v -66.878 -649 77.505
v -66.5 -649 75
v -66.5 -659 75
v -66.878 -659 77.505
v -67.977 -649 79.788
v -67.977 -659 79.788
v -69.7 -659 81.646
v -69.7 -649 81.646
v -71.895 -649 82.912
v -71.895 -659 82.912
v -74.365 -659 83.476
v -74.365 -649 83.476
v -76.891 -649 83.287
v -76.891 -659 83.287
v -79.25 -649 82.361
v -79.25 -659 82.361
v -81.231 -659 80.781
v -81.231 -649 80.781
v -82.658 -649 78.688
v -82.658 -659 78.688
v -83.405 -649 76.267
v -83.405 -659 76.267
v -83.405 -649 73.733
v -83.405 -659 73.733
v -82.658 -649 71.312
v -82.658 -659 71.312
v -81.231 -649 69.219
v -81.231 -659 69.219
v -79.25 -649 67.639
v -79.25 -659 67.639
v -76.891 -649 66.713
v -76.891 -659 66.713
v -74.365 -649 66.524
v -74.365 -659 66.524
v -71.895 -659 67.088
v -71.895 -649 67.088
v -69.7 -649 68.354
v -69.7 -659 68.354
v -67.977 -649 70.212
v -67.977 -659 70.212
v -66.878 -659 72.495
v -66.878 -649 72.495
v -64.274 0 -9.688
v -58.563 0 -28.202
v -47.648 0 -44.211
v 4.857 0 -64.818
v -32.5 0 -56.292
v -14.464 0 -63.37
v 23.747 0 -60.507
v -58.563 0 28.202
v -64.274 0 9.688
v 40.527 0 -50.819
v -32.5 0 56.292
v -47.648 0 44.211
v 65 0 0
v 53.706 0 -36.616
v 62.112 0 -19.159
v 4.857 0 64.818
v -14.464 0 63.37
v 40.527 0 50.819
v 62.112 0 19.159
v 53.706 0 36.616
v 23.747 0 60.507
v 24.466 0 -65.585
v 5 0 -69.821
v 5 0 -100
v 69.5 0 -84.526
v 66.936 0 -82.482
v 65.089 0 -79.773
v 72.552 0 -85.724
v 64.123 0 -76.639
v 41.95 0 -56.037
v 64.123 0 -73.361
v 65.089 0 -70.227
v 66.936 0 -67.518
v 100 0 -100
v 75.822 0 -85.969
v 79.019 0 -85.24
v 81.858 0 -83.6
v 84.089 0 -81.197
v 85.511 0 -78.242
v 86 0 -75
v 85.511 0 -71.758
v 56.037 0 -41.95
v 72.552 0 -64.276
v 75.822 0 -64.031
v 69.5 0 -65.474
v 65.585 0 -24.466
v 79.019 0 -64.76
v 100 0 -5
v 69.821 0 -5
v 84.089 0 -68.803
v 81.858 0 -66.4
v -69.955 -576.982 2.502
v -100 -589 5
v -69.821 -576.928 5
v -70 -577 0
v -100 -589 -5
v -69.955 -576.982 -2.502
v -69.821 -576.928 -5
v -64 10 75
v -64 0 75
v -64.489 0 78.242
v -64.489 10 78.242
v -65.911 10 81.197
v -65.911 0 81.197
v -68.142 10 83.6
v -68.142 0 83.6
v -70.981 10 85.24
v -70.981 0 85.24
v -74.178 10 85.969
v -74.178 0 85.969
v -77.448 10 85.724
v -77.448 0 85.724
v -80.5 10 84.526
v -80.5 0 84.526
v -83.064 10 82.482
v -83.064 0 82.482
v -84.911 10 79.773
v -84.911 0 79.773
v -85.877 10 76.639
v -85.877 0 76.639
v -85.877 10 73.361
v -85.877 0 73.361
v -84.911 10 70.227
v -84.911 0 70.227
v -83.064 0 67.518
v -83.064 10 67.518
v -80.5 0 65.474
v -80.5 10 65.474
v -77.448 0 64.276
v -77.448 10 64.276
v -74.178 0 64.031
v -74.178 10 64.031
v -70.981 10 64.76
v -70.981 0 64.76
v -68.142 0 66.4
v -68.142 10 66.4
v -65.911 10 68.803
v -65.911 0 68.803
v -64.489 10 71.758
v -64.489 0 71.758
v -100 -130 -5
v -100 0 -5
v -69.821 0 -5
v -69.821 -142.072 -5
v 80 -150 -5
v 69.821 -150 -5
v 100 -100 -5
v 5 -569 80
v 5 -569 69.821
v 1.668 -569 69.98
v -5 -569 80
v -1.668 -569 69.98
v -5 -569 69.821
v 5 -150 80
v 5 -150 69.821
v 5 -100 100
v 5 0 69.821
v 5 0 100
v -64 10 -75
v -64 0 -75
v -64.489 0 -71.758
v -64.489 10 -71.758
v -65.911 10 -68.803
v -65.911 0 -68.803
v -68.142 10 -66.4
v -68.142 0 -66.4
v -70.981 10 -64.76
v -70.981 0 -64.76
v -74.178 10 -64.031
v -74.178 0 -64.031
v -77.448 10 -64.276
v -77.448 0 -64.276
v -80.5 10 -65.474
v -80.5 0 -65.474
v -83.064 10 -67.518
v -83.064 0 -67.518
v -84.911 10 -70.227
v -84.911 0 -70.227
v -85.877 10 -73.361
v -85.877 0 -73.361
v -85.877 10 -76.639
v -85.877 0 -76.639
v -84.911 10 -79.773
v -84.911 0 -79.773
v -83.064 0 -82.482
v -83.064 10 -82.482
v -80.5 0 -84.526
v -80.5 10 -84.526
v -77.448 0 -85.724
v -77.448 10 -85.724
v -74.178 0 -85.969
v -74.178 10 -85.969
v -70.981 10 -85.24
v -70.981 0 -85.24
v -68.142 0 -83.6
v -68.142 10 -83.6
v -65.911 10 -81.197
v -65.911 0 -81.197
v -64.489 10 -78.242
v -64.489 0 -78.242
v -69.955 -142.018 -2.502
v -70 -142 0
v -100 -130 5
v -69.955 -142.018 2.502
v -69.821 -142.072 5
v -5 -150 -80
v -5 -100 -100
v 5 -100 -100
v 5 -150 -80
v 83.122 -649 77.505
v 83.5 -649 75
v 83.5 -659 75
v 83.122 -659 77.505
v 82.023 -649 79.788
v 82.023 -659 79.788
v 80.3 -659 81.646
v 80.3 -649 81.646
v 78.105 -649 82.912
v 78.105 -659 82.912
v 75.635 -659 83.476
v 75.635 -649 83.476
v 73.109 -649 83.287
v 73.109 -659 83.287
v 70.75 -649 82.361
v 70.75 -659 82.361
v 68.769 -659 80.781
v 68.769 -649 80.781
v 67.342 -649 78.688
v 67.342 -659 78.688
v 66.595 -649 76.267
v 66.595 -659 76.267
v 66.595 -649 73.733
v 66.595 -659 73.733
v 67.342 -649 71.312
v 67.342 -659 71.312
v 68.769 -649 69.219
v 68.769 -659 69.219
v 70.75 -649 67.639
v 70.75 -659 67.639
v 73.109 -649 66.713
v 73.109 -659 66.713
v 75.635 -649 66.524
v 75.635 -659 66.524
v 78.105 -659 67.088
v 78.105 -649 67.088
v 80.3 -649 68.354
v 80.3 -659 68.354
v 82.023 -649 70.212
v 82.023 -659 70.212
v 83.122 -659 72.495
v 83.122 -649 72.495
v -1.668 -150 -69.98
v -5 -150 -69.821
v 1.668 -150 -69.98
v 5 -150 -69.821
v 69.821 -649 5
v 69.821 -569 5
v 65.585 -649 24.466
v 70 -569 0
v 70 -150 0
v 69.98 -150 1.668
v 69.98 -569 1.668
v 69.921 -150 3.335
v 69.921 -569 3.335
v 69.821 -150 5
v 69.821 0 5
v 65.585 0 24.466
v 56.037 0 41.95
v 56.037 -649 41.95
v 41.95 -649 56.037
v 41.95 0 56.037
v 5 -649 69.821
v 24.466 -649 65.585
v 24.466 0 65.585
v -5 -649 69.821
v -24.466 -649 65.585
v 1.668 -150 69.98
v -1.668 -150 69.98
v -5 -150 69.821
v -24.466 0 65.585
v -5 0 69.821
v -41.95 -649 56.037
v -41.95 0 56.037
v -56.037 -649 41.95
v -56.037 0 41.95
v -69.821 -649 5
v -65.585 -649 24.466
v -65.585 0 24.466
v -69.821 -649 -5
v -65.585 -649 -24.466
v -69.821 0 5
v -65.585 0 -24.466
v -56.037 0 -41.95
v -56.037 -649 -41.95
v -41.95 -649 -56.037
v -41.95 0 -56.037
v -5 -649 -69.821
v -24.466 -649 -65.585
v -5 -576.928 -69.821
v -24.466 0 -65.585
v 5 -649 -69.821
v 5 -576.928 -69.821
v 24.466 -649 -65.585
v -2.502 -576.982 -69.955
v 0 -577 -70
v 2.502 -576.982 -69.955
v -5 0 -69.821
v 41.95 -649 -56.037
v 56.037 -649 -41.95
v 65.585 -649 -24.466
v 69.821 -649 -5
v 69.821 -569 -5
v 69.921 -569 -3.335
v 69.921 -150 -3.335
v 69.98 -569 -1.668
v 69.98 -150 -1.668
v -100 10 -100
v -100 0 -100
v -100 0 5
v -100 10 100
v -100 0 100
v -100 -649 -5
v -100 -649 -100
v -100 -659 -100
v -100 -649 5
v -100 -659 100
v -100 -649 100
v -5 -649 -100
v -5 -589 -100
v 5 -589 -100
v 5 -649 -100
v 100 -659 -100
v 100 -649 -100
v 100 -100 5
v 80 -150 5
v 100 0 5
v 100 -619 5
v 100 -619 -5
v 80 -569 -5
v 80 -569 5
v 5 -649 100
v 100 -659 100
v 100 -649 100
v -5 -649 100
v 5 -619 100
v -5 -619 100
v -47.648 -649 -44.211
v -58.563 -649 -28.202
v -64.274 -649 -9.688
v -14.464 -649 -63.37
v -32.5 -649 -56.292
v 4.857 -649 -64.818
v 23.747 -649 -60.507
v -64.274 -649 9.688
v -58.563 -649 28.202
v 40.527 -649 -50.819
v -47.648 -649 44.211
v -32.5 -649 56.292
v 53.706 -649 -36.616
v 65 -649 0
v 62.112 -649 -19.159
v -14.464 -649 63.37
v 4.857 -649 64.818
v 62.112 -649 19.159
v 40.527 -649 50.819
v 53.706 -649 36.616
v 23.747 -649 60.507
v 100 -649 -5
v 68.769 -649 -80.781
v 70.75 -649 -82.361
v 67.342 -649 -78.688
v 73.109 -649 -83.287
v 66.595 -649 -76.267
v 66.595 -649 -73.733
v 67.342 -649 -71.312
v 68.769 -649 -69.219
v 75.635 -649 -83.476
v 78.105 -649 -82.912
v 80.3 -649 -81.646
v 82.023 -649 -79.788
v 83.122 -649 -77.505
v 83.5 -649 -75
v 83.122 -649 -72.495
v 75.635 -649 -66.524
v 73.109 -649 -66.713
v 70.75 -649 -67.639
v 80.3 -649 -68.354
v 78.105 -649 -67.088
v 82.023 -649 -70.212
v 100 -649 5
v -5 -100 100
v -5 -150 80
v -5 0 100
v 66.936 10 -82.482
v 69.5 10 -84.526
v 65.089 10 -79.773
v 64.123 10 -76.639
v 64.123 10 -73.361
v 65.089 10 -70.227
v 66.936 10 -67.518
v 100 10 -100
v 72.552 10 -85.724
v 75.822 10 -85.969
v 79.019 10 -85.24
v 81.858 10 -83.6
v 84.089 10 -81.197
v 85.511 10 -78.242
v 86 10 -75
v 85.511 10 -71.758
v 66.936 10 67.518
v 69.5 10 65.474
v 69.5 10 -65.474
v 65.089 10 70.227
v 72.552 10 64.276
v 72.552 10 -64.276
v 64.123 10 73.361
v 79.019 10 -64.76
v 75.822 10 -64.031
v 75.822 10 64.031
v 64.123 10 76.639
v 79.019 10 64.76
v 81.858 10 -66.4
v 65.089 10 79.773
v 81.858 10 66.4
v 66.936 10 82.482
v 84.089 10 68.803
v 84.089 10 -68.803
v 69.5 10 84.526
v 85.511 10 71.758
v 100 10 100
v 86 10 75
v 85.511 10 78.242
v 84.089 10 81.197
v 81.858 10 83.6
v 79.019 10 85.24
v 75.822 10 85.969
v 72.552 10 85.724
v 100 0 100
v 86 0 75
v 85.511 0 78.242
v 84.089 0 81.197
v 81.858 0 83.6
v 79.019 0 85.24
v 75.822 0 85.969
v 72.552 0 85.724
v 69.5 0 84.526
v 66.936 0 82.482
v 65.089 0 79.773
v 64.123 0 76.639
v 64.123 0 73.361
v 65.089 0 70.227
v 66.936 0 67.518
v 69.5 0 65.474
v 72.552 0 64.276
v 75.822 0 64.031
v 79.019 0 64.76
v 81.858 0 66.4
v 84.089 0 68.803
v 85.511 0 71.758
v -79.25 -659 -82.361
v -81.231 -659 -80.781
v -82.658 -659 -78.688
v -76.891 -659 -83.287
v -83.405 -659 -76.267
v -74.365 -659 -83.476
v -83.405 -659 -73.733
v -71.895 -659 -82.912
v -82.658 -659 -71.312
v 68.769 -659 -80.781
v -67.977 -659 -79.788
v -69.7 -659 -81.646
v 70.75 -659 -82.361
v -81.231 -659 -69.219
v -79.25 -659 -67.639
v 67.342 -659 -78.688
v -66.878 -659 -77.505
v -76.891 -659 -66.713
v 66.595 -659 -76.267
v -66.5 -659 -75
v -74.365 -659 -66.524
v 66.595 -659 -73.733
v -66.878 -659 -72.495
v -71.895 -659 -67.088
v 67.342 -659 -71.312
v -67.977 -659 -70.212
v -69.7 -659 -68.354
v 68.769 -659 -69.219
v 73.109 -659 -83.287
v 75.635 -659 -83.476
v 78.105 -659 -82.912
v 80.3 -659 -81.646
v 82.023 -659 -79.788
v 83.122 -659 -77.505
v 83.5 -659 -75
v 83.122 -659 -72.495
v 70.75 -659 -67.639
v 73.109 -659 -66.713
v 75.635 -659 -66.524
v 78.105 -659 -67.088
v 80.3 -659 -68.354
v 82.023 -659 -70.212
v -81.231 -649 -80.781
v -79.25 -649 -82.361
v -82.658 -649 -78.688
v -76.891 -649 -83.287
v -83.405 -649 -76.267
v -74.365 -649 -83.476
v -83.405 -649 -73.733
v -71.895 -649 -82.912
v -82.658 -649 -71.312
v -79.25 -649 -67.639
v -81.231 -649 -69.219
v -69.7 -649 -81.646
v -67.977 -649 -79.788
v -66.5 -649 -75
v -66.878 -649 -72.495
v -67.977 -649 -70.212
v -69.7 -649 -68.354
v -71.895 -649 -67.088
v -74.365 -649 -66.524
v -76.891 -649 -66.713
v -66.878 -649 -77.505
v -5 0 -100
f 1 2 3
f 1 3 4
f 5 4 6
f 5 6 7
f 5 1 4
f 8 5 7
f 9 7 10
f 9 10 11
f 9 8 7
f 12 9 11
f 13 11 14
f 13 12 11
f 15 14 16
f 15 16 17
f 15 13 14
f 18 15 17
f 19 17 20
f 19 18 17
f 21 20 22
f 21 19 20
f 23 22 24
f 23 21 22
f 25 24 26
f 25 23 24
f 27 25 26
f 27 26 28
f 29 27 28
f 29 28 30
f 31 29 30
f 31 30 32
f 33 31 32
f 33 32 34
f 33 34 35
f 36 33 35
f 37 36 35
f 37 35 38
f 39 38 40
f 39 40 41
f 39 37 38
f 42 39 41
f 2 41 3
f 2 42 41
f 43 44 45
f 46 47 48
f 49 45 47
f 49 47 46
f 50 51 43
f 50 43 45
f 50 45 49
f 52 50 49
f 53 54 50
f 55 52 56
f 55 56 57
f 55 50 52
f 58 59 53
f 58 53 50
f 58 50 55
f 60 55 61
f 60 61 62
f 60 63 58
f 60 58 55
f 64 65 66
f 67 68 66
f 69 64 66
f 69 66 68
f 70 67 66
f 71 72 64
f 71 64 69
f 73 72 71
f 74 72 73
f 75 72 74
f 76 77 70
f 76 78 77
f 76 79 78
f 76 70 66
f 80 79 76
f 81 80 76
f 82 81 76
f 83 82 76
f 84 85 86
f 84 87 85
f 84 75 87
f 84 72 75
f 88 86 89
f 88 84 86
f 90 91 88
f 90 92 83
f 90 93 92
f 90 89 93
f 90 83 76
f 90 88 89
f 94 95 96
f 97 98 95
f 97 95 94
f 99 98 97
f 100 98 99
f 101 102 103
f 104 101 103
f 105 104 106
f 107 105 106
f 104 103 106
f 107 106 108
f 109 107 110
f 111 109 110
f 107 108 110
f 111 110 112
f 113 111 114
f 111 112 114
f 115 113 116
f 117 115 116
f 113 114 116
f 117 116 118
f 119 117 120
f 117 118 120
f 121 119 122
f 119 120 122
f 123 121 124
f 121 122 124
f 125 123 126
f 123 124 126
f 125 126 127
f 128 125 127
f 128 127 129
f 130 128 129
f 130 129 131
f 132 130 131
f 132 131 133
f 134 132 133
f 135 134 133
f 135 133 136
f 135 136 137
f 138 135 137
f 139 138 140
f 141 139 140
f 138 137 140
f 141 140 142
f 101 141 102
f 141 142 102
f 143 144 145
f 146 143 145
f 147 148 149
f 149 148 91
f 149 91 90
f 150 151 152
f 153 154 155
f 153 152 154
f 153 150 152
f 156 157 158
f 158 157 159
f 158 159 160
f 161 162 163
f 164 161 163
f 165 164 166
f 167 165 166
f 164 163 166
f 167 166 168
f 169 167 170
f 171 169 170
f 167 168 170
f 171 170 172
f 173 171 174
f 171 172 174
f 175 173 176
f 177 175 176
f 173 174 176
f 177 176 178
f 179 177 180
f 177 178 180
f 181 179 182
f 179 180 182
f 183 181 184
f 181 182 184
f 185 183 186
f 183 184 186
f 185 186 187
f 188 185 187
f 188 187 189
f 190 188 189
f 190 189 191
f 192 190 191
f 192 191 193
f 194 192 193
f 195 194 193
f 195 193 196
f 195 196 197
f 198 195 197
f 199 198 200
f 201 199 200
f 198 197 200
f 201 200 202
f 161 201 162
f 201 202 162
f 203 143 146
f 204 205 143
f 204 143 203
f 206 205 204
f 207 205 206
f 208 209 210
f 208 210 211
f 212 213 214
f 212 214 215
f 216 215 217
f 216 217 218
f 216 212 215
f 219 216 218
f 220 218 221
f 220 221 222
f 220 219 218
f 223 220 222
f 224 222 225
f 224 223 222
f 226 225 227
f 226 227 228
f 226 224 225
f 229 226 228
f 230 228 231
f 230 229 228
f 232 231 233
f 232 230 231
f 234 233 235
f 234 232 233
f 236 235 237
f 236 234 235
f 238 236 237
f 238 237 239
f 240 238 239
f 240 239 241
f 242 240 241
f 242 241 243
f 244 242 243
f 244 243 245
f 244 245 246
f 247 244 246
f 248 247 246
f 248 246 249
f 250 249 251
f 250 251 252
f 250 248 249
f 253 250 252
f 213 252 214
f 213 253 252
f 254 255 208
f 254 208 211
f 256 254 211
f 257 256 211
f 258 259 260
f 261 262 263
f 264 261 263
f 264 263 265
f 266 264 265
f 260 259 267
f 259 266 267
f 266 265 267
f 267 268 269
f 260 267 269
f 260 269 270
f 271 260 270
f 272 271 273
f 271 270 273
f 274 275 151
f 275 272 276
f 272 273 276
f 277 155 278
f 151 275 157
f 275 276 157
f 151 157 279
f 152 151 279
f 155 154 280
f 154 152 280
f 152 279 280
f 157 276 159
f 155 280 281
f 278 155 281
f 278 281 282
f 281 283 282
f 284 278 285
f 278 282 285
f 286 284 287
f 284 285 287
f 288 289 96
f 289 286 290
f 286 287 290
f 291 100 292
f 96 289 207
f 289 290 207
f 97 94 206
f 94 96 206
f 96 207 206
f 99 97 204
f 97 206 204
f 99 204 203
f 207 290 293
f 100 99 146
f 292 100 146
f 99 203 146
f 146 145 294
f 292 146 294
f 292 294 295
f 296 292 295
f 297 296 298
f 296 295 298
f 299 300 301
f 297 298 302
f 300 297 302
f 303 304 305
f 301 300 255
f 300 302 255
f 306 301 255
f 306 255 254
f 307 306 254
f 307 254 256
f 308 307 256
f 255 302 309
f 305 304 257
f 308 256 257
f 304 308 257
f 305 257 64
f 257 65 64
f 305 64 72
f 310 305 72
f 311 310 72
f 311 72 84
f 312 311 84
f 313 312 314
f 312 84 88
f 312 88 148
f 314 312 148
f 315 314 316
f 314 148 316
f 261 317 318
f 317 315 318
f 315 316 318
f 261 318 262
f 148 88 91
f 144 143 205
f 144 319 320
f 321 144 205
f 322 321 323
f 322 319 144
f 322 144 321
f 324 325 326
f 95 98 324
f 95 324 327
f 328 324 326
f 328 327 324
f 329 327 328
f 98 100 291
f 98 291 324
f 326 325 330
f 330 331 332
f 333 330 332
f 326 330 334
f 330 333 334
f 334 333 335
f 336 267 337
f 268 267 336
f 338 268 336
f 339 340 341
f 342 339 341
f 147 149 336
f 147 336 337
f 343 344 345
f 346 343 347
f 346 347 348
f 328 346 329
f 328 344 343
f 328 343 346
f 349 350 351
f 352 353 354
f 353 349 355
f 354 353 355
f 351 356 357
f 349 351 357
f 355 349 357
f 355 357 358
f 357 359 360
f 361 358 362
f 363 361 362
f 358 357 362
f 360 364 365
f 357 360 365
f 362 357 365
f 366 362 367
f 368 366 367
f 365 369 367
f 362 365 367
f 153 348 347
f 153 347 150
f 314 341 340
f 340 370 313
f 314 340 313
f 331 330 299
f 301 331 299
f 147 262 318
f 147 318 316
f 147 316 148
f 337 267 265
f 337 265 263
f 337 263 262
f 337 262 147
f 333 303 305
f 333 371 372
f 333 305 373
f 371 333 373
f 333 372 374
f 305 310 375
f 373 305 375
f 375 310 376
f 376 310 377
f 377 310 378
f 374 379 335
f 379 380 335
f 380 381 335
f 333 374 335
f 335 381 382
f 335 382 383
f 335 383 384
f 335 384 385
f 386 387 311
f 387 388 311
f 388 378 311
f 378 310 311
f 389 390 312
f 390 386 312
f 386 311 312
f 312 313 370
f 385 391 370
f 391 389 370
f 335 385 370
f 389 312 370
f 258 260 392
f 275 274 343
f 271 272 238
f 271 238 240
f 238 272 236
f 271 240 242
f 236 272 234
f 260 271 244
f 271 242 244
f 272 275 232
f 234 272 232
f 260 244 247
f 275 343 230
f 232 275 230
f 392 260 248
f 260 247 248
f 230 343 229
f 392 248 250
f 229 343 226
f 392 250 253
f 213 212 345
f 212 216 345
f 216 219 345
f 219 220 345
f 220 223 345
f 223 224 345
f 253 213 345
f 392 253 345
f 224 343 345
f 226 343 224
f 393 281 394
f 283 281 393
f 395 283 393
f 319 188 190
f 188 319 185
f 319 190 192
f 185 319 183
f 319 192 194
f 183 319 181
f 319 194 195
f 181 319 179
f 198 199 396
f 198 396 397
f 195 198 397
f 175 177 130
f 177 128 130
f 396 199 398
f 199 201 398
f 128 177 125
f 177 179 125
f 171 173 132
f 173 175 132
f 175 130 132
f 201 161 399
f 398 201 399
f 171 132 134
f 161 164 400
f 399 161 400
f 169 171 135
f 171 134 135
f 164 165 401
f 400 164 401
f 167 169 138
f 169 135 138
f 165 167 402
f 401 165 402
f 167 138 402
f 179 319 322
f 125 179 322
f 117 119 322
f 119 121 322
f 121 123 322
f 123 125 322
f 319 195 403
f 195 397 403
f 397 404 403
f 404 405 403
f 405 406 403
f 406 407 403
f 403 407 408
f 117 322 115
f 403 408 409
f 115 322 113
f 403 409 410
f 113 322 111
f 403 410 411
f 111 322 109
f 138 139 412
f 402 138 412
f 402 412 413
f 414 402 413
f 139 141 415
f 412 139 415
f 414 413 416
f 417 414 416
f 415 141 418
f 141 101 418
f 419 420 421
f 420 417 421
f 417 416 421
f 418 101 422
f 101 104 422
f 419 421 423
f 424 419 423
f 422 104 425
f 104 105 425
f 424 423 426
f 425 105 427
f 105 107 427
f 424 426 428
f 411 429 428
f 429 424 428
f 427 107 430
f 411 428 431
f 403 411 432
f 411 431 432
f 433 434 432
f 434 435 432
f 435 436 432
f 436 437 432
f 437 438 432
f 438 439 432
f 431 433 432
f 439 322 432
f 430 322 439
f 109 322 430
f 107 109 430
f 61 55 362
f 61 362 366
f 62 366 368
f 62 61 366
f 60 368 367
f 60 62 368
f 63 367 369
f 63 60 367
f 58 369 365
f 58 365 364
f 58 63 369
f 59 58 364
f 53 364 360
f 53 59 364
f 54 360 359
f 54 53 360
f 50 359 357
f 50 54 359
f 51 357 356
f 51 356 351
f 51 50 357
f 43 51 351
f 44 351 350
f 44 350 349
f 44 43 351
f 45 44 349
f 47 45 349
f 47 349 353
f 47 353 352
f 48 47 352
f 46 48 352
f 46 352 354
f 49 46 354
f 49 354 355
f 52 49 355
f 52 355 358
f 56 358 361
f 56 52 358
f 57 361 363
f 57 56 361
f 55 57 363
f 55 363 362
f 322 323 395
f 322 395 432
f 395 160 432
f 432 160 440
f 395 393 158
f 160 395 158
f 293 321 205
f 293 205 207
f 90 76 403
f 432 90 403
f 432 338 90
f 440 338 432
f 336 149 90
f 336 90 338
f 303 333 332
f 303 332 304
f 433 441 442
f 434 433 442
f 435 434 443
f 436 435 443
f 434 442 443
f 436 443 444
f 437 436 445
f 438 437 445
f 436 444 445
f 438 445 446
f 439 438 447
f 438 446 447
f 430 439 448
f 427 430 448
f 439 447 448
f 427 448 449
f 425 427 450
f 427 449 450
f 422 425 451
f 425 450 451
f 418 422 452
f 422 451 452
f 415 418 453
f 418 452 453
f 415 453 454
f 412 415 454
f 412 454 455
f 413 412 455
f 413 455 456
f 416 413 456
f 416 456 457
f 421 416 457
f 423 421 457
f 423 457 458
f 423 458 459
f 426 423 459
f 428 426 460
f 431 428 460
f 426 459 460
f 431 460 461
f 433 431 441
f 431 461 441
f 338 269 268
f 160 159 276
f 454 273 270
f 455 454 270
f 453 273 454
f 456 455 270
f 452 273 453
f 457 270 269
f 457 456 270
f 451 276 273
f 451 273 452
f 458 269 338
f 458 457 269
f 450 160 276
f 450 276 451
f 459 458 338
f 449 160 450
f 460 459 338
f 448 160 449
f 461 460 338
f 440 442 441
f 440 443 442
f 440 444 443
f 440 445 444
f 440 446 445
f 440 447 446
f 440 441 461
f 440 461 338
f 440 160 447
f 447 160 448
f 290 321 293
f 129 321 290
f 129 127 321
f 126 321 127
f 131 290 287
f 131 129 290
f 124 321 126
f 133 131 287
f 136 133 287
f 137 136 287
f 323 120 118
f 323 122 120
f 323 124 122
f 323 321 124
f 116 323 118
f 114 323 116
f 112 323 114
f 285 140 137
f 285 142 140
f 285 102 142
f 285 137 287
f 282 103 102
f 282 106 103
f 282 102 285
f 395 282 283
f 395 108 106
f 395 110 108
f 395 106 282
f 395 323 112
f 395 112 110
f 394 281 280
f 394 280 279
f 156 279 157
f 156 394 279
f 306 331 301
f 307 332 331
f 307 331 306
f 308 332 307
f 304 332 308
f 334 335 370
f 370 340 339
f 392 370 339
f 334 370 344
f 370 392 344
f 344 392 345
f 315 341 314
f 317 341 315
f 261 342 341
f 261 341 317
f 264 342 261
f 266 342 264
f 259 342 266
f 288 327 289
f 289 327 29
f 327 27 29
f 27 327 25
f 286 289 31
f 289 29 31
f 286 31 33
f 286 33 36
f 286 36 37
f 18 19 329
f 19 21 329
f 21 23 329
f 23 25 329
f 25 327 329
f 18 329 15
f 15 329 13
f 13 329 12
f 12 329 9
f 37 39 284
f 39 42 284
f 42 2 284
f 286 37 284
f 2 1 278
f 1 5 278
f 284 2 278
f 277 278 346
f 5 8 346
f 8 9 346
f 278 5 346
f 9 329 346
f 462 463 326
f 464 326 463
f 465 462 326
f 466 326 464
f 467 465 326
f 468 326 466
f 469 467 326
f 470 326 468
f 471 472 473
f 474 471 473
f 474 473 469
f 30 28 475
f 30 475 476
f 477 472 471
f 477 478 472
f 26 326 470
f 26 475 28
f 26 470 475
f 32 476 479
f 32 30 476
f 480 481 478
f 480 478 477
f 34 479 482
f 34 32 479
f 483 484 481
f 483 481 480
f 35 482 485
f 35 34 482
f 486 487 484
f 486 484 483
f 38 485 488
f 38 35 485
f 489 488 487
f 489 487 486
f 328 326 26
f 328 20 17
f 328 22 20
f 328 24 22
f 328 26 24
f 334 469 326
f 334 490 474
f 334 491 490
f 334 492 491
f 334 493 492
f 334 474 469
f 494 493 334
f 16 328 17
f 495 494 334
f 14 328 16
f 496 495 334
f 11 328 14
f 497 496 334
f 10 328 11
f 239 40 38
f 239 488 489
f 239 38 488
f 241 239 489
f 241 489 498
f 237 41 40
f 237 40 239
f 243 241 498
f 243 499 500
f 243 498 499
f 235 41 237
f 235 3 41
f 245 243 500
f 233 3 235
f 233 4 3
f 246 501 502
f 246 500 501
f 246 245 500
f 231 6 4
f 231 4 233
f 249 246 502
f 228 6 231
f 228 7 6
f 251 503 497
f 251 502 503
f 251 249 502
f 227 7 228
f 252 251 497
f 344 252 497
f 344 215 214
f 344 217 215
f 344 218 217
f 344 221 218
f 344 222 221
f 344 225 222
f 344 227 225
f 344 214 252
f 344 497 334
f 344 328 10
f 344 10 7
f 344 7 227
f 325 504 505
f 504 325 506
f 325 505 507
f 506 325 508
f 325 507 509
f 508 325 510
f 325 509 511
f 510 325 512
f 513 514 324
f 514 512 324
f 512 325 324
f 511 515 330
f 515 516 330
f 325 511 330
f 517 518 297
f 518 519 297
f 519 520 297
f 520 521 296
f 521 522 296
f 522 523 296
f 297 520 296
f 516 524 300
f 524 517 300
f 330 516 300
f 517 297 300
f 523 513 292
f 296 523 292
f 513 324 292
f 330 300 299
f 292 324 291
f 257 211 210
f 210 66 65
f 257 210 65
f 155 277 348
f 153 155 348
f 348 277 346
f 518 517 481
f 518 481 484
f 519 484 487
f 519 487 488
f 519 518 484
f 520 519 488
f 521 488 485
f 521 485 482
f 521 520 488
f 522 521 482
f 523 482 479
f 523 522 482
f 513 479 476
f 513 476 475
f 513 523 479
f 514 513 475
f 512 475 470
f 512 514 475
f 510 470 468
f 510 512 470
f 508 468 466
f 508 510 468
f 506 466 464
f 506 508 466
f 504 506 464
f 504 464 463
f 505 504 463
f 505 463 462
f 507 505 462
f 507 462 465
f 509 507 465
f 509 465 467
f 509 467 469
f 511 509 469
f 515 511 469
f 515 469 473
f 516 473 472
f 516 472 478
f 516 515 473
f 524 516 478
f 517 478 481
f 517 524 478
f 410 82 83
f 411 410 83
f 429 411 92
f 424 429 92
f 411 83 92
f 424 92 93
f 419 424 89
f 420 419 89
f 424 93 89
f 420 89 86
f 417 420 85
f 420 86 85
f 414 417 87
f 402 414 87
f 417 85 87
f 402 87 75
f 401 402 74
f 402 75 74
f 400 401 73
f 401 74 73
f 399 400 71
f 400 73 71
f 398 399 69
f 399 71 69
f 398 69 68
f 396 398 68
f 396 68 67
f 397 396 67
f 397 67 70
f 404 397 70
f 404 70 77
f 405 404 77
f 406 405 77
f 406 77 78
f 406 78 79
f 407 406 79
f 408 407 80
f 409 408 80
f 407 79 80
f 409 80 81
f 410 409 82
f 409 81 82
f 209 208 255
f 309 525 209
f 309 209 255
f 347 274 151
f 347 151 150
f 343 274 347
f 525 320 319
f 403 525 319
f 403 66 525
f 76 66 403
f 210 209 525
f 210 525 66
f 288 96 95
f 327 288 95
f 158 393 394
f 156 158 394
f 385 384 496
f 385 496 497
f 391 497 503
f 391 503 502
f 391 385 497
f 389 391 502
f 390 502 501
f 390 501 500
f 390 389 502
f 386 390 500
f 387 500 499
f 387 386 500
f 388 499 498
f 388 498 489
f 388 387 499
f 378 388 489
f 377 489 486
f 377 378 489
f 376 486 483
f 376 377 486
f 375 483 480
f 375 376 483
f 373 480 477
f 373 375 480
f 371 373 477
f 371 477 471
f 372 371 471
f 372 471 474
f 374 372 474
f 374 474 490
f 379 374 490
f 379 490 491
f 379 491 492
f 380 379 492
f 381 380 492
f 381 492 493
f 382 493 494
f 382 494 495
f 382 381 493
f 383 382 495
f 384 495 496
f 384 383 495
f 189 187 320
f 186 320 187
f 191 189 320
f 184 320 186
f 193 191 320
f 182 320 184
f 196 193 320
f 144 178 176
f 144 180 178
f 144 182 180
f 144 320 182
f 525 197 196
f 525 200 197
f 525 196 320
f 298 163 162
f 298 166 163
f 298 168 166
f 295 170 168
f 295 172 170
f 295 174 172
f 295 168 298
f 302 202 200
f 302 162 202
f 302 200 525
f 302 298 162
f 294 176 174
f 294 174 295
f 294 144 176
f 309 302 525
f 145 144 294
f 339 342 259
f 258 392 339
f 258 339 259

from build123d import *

# Parameters (mm, degrees)
F0_R          = 70
F0_R_2        = 65
F1_DEPTH      = 649
F2_W          = 200
F2_H          = 200
F2_R          = 11
F3_DEPTH      = 10
F4_W          = 30.1787997812
F4_H          = 10
F4_W_2        = 10
F4_H_2        = 30.1787997812
F5_DEPTH      = 150
F6_T1_DEPTH   = 269.311363913
F6_T3_DEPTH   = 269.311363913
F6_T8_DEPTH   = 269.311363913
F6_S9_R       = 70
F6_T10_DEPTH  = 139
F8_W          = 200
F8_H          = 200
F8_R          = 8.5
F9_DEPTH      = 10
F10_W         = 10
F10_H         = 30.1787997812
F10_W_2       = 30.1787997812
F10_H_2       = 10
F11_DEPTH     = 80
F12_T1_DEPTH  = 269.311363913
F12_T3_DEPTH  = 269.311363913
F12_T8_DEPTH  = 269.311363913
F12_S9_R      = 70
F12_T10_DEPTH = 139
F12_T14_DEPTH = 269.311363913
F12_S15_R     = 70
F12_T16_DEPTH = 139


# Not quite as in the source:
# - a fillet or chamfer that OpenCascade refuses, or shapes differently, is made with other operations: its cross-section is extruded or revolved along the edge and cut away or added


with BuildPart() as f1:
    # F0 (on Front) → F1 (new body)
    with BuildSketch(Plane.XZ):
        Circle(F0_R)
        Circle(F0_R_2, mode=Mode.SUBTRACT)
    extrude(amount=F1_DEPTH)

    # F2 (on Front) → F3 (join)
    with BuildSketch(Plane.XZ):
        Rectangle(F2_W, F2_H)
        with Locations((-75, -75)):
            Circle(F2_R, mode=Mode.SUBTRACT)
        with Locations((75, -75)):
            Circle(F2_R, mode=Mode.SUBTRACT)
        with Locations((-75, 75)):
            Circle(F2_R, mode=Mode.SUBTRACT)
        with Locations((75, 75)):
            Circle(F2_R, mode=Mode.SUBTRACT)
    extrude(amount=-F3_DEPTH)

    # F4 (on Front) → F5 (join)
    with BuildSketch(Plane.XZ):
        with Locations((-84.9106001094, 0)):
            Rectangle(F4_W, F4_H)
        with Locations((0, 84.9106001094)):
            Rectangle(F4_W_2, F4_H_2)
        with Locations((84.9106001094, 0)):
            Rectangle(F4_W, F4_H)
        with Locations((0, -84.9106001094)):
            Rectangle(F4_W_2, F4_H_2)
    extrude(amount=F5_DEPTH)

    # F6: chamfer of 50 x 20 on 4 edges, made by hand

    # F6_s2 → F6_t1 (cut)
    with BuildSketch(Plane.YZ.offset(-134.6556819565)):
        Polygon((-100, 100), (-150, 80), (-150, 100), align=None)
        Polygon((-100, -100), (-150, -80), (-150, -100), align=None)
    extrude(amount=F6_T1_DEPTH, mode=Mode.SUBTRACT)

    # F6_s4 → F6_t3 (cut)
    with BuildSketch(Plane.XY.offset(-134.6556819565)):
        Polygon((100, -100), (80, -150), (100, -150), align=None)
    extrude(amount=F6_T3_DEPTH, mode=Mode.SUBTRACT)


with BuildPart() as f6_tool6:
    # F6_s7 → F6_t8 (new body)
    with BuildSketch(Plane.XY.offset(134.6556819565)):
        Polygon((-100, -130), (-50, -150), (-100, -150), align=None)
    extrude(amount=-F6_T8_DEPTH)

    # F6_s9 → F6_t10 (cut, symmetric)
    with BuildSketch(Plane.XZ.offset(140)):
        Circle(F6_S9_R)
    extrude(amount=F6_T10_DEPTH, both=True, mode=Mode.SUBTRACT)


with BuildPart() as f1_1:
    add(f1.part)

    # F6_t5: cut F6_tool6
    add(f6_tool6.part, mode=Mode.SUBTRACT)

    # F8 (on offset) → F9 (join)
    with BuildSketch(Plane.XZ.offset(649)):
        Rectangle(F8_W, F8_H)
        with Locations((-75, -75)):
            Circle(F8_R, mode=Mode.SUBTRACT)
        with Locations((75, -75)):
            Circle(F8_R, mode=Mode.SUBTRACT)
        with Locations((-75, 75)):
            Circle(F8_R, mode=Mode.SUBTRACT)
        with Locations((75, 75)):
            Circle(F8_R, mode=Mode.SUBTRACT)
    extrude(amount=F9_DEPTH)

    # F10 (on face) → F11 (join)
    with BuildSketch(Plane(origin=(0, -649, 0), x_dir=(-1, 0, 0), z_dir=(0, 1, 0))):
        with Locations((0, 84.9106001094)):
            Rectangle(F10_W, F10_H)
        with Locations((84.9106001094, 0)):
            Rectangle(F10_W_2, F10_H_2)
        with Locations((0, -84.9106001094)):
            Rectangle(F10_W, F10_H)
        with Locations((-84.9106001094, 0)):
            Rectangle(F10_W_2, F10_H_2)
    extrude(amount=F11_DEPTH)

    # F12: chamfer of 20 x 50 on 4 edges, made by hand

    # F12_s2 → F12_t1 (cut)
    with BuildSketch(Plane.YZ.offset(-134.6556819565)):
        Polygon((-619, 100), (-569, 80), (-569, 100), align=None)
    extrude(amount=F12_T1_DEPTH, mode=Mode.SUBTRACT)

    # F12_s4 → F12_t3 (cut)
    with BuildSketch(Plane.XY.offset(-134.6556819565)):
        Polygon((100, -619), (80, -569), (100, -569), align=None)
    extrude(amount=F12_T3_DEPTH, mode=Mode.SUBTRACT)


with BuildPart() as f12_tool6:
    # F12_s7 → F12_t8 (new body)
    with BuildSketch(Plane.XY.offset(-134.6556819565)):
        Polygon((-100, -589), (-50, -569), (-100, -569), align=None)
    extrude(amount=F12_T8_DEPTH)

    # F12_s9 → F12_t10 (cut, symmetric)
    with BuildSketch(Plane.XZ.offset(579)):
        Circle(F12_S9_R)
    extrude(amount=F12_T10_DEPTH, both=True, mode=Mode.SUBTRACT)


with BuildPart() as f1_2:
    add(f1_1.part)

    # F12_t5: cut F12_tool6
    add(f12_tool6.part, mode=Mode.SUBTRACT)


with BuildPart() as f12_tool12:
    # F12_s13 → F12_t14 (new body)
    with BuildSketch(Plane.YZ.offset(134.6556819565)):
        Polygon((-589, -100), (-569, -50), (-569, -100), align=None)
    extrude(amount=-F12_T14_DEPTH)

    # F12_s15 → F12_t16 (cut, symmetric)
    with BuildSketch(Plane.XZ.offset(579)):
        Circle(F12_S15_R)
    extrude(amount=F12_T16_DEPTH, both=True, mode=Mode.SUBTRACT)


with BuildPart() as f1_3:
    add(f1_2.part)

    # F12_t11: cut F12_tool12
    add(f12_tool12.part, mode=Mode.SUBTRACT)


solid = f1_3.part
